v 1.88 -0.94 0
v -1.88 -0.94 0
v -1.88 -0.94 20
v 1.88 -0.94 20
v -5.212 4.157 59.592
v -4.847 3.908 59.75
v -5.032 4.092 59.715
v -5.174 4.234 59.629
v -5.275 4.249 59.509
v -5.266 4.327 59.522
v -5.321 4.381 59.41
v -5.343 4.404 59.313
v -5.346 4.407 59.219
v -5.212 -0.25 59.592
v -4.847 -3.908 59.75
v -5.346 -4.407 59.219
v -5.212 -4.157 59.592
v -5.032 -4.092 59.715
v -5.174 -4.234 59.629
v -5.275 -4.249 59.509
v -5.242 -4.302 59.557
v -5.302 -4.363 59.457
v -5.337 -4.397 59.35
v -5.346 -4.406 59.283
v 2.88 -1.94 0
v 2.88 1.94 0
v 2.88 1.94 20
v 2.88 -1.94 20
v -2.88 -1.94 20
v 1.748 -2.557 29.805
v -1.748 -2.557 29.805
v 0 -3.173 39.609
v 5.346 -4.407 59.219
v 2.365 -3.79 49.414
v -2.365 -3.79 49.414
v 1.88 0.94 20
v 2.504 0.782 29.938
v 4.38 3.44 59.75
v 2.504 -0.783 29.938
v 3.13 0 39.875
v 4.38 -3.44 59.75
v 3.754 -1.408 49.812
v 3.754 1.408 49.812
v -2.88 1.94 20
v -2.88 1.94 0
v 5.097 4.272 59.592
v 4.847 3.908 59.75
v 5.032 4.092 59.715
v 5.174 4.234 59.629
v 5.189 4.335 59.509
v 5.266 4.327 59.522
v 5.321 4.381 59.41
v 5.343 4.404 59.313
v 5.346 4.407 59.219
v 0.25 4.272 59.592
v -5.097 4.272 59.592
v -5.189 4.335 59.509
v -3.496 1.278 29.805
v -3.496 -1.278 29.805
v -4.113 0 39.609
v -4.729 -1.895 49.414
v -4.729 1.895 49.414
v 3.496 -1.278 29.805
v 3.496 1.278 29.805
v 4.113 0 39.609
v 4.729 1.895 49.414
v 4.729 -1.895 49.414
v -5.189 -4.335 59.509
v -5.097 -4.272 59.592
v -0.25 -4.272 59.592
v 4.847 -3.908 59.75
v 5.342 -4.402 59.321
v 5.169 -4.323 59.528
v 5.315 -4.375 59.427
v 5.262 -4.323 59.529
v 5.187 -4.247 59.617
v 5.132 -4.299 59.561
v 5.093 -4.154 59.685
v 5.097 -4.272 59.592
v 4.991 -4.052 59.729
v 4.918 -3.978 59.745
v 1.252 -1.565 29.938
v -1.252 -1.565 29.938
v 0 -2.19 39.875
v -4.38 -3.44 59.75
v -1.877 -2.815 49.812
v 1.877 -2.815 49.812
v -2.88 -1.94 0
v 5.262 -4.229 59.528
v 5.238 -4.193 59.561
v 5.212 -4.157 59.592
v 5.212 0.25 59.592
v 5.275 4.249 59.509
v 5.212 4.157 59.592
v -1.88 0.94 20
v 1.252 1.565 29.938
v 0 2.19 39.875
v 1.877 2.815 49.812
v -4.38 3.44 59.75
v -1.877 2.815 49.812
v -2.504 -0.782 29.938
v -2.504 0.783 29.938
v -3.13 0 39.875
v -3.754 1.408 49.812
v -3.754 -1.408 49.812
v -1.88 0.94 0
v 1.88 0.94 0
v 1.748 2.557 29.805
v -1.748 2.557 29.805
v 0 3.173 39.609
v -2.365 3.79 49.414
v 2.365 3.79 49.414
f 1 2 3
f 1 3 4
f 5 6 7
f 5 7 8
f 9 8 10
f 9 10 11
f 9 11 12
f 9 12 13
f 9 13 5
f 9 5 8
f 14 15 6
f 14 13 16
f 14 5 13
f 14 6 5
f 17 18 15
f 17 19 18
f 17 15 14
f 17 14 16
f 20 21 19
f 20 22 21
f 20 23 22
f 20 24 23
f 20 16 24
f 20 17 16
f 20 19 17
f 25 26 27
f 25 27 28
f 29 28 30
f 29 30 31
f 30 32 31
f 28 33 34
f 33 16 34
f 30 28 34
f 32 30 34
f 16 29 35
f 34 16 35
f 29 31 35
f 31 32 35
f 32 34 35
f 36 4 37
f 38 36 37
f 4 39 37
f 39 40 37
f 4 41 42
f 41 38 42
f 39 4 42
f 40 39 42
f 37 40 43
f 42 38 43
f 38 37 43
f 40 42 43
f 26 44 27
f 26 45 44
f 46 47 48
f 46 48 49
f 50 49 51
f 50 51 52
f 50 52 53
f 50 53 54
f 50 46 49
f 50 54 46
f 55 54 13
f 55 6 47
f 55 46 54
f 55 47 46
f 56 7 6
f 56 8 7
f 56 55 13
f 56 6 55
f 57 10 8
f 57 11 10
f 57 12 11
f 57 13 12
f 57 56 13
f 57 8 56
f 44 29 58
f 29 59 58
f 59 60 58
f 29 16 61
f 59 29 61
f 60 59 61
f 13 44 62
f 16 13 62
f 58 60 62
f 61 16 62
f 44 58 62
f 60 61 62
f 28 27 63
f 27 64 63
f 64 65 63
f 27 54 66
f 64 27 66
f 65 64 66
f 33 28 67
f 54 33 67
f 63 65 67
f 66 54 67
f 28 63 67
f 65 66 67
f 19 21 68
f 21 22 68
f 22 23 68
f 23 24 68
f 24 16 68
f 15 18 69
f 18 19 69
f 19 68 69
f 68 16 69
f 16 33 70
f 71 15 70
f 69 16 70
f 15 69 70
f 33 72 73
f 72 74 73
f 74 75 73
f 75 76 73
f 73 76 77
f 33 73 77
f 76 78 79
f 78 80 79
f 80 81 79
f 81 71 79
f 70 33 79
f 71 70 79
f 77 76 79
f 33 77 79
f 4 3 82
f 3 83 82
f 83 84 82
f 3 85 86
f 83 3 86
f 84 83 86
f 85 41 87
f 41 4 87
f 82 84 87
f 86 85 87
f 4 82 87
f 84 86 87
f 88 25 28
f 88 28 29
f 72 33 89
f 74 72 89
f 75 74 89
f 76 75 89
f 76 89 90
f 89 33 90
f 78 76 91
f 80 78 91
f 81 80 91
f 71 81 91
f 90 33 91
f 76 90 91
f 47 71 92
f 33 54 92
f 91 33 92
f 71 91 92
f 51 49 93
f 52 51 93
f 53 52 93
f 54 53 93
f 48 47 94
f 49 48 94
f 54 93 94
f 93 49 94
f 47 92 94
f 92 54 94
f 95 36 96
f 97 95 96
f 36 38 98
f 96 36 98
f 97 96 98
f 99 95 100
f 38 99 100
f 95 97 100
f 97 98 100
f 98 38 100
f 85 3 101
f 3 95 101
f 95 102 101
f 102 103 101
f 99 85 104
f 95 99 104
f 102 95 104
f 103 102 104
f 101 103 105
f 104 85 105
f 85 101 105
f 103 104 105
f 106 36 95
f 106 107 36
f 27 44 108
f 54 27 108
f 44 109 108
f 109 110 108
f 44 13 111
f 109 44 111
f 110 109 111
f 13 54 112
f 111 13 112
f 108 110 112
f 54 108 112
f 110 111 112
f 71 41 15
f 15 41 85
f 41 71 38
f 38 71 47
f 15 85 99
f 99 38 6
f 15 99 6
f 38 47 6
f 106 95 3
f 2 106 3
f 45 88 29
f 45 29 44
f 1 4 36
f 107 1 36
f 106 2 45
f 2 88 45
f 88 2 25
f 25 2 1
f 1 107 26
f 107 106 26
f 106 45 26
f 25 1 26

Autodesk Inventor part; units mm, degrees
ref_plane "YZ Plane" through (0, 0, 0) normal (1, 0, 0) x (0, 1, 0)
ref_plane "XZ Plane" through (0, 0, 0) normal (0, 1, 0) x (-1, 0, 0)
sketch "Skizze1" plane through (0, 0, 0) normal (0, 0, 1) x (1, 0, 0)
  line L0 (1.8795, 0.94) -> (-1.8795, 0.94)
  line L1 (-1.8795, 0.94) -> (-1.8795, -0.94)
  line L2 (-1.8795, -0.94) -> (1.8795, -0.94)
  line L3 (1.8795, -0.94) -> (1.8795, 0.94)
  line L4 (1.8795, 0.94) -> (-1.8795, -0.94) construction
  line L5 (-1.8795, 0.94) -> (1.8795, -0.94) construction
  line L6 (-2.8795, -1.94) -> (-2.8795, 1.94)
  line L7 (-2.8795, 1.94) -> (2.8795, 1.94)
  line L8 (2.8795, 1.94) -> (2.8795, -1.94)
  line L9 (2.8795, -1.94) -> (-2.8795, -1.94)
  point P0 (0, 0)
  dimension "d0" = 1.88
  dimension "d1" = 3.759
  dimension "d2" = 1
extrude "Ex1-RWG" add sketch "Skizze1" along normal blind 20
ref_plane "Endebene" through (0, 0, 59.75) normal (0, 0, 1) x (1, 0, 0)
sketch "S-Hornöffnung" plane through (0, 0, 59.75) normal (0, 0, 1) x (1, 0, 0)
  line L0 (2.8795, -1.94) -> (2.8795, 1.94) projected
  line L1 (2.8795, 1.94) -> (-2.8795, 1.94) projected
  line L2 (-2.8795, 1.94) -> (-2.8795, -1.94) projected
  line L3 (-2.8795, -1.94) -> (2.8795, -1.94) projected
  line L4 (1.8795, 0.94) -> (1.8795, -0.94) projected
  line L5 (1.8795, -0.94) -> (-1.8795, -0.94) projected
  line L6 (-1.8795, -0.94) -> (-1.8795, 0.94) projected
  line L7 (-1.8795, 0.94) -> (1.8795, 0.94) projected
  line L8 (4.3795, 3.44) -> (4.3795, -3.44)
  line L9 (4.3795, -3.44) -> (-4.3795, -3.44)
  line L10 (-4.3795, -3.44) -> (-4.3795, 3.44)
  line L11 (-4.3795, 3.44) -> (4.3795, 3.44)
  line L12 (5.3795, -4.44) -> (5.3795, 4.44)
  line L13 (5.3795, 4.44) -> (-5.3795, 4.44)
  line L14 (-5.3795, 4.44) -> (-5.3795, -4.44)
  line L15 (-5.3795, -4.44) -> (5.3795, -4.44)
  point P0 (0, 0)
  dimension "d19" = 2.5
  dimension "d20" = 1
sketch "S-RWGÜbergang" plane through (0, 0, 20) normal (0, 0, 1) x (1, 0, 0)
  line L0 (2.8795, -1.94) -> (2.8795, 1.94) projected
  line L1 (2.8795, 1.94) -> (-2.8795, 1.94) projected
  line L2 (-2.8795, 1.94) -> (-2.8795, -1.94) projected
  line L3 (-2.8795, -1.94) -> (2.8795, -1.94) projected
  line L4 (1.8795, 0.94) -> (1.8795, -0.94) projected
  line L5 (1.8795, -0.94) -> (-1.8795, -0.94) projected
  line L6 (-1.8795, -0.94) -> (-1.8795, 0.94) projected
  line L7 (-1.8795, 0.94) -> (1.8795, 0.94) projected
  point P0 (0, 0)
loft "Erhebung-Horn1" add profiles "S-Hornöffnung" section 1 edges at (2.8795, 0, 20) (0, 1.94, 20) (-2.8795, 0, 20) (0, -1.94, 20) contours L3 L2 L1 L0 | L4 L5 L6 L7 | L8 L9 L10 L11 | L15 L14 L13 L12
loft "Erhebung-Horn2" cut profiles "S-Hornöffnung" section 1 edges at (0, 0.94, 20) (1.8795, 0, 20) (0, -0.94, 20) (-1.8795, 0, 20) contours L3 L2 L1 L0 | L4 L5 L6 L7 | L8 L9 L10 L11
fillet "Rundung-0.5mm" radius 0.5 4 edges at (0, 4.44, 59.75) (-5.3795, 0, 59.75) (0, -4.44, 59.75) (5.3795, 0, 59.75)
fillet_without_effect "Rundung-10mm"
properties part number "RWG_Horn_ProbeAntennaV1"
